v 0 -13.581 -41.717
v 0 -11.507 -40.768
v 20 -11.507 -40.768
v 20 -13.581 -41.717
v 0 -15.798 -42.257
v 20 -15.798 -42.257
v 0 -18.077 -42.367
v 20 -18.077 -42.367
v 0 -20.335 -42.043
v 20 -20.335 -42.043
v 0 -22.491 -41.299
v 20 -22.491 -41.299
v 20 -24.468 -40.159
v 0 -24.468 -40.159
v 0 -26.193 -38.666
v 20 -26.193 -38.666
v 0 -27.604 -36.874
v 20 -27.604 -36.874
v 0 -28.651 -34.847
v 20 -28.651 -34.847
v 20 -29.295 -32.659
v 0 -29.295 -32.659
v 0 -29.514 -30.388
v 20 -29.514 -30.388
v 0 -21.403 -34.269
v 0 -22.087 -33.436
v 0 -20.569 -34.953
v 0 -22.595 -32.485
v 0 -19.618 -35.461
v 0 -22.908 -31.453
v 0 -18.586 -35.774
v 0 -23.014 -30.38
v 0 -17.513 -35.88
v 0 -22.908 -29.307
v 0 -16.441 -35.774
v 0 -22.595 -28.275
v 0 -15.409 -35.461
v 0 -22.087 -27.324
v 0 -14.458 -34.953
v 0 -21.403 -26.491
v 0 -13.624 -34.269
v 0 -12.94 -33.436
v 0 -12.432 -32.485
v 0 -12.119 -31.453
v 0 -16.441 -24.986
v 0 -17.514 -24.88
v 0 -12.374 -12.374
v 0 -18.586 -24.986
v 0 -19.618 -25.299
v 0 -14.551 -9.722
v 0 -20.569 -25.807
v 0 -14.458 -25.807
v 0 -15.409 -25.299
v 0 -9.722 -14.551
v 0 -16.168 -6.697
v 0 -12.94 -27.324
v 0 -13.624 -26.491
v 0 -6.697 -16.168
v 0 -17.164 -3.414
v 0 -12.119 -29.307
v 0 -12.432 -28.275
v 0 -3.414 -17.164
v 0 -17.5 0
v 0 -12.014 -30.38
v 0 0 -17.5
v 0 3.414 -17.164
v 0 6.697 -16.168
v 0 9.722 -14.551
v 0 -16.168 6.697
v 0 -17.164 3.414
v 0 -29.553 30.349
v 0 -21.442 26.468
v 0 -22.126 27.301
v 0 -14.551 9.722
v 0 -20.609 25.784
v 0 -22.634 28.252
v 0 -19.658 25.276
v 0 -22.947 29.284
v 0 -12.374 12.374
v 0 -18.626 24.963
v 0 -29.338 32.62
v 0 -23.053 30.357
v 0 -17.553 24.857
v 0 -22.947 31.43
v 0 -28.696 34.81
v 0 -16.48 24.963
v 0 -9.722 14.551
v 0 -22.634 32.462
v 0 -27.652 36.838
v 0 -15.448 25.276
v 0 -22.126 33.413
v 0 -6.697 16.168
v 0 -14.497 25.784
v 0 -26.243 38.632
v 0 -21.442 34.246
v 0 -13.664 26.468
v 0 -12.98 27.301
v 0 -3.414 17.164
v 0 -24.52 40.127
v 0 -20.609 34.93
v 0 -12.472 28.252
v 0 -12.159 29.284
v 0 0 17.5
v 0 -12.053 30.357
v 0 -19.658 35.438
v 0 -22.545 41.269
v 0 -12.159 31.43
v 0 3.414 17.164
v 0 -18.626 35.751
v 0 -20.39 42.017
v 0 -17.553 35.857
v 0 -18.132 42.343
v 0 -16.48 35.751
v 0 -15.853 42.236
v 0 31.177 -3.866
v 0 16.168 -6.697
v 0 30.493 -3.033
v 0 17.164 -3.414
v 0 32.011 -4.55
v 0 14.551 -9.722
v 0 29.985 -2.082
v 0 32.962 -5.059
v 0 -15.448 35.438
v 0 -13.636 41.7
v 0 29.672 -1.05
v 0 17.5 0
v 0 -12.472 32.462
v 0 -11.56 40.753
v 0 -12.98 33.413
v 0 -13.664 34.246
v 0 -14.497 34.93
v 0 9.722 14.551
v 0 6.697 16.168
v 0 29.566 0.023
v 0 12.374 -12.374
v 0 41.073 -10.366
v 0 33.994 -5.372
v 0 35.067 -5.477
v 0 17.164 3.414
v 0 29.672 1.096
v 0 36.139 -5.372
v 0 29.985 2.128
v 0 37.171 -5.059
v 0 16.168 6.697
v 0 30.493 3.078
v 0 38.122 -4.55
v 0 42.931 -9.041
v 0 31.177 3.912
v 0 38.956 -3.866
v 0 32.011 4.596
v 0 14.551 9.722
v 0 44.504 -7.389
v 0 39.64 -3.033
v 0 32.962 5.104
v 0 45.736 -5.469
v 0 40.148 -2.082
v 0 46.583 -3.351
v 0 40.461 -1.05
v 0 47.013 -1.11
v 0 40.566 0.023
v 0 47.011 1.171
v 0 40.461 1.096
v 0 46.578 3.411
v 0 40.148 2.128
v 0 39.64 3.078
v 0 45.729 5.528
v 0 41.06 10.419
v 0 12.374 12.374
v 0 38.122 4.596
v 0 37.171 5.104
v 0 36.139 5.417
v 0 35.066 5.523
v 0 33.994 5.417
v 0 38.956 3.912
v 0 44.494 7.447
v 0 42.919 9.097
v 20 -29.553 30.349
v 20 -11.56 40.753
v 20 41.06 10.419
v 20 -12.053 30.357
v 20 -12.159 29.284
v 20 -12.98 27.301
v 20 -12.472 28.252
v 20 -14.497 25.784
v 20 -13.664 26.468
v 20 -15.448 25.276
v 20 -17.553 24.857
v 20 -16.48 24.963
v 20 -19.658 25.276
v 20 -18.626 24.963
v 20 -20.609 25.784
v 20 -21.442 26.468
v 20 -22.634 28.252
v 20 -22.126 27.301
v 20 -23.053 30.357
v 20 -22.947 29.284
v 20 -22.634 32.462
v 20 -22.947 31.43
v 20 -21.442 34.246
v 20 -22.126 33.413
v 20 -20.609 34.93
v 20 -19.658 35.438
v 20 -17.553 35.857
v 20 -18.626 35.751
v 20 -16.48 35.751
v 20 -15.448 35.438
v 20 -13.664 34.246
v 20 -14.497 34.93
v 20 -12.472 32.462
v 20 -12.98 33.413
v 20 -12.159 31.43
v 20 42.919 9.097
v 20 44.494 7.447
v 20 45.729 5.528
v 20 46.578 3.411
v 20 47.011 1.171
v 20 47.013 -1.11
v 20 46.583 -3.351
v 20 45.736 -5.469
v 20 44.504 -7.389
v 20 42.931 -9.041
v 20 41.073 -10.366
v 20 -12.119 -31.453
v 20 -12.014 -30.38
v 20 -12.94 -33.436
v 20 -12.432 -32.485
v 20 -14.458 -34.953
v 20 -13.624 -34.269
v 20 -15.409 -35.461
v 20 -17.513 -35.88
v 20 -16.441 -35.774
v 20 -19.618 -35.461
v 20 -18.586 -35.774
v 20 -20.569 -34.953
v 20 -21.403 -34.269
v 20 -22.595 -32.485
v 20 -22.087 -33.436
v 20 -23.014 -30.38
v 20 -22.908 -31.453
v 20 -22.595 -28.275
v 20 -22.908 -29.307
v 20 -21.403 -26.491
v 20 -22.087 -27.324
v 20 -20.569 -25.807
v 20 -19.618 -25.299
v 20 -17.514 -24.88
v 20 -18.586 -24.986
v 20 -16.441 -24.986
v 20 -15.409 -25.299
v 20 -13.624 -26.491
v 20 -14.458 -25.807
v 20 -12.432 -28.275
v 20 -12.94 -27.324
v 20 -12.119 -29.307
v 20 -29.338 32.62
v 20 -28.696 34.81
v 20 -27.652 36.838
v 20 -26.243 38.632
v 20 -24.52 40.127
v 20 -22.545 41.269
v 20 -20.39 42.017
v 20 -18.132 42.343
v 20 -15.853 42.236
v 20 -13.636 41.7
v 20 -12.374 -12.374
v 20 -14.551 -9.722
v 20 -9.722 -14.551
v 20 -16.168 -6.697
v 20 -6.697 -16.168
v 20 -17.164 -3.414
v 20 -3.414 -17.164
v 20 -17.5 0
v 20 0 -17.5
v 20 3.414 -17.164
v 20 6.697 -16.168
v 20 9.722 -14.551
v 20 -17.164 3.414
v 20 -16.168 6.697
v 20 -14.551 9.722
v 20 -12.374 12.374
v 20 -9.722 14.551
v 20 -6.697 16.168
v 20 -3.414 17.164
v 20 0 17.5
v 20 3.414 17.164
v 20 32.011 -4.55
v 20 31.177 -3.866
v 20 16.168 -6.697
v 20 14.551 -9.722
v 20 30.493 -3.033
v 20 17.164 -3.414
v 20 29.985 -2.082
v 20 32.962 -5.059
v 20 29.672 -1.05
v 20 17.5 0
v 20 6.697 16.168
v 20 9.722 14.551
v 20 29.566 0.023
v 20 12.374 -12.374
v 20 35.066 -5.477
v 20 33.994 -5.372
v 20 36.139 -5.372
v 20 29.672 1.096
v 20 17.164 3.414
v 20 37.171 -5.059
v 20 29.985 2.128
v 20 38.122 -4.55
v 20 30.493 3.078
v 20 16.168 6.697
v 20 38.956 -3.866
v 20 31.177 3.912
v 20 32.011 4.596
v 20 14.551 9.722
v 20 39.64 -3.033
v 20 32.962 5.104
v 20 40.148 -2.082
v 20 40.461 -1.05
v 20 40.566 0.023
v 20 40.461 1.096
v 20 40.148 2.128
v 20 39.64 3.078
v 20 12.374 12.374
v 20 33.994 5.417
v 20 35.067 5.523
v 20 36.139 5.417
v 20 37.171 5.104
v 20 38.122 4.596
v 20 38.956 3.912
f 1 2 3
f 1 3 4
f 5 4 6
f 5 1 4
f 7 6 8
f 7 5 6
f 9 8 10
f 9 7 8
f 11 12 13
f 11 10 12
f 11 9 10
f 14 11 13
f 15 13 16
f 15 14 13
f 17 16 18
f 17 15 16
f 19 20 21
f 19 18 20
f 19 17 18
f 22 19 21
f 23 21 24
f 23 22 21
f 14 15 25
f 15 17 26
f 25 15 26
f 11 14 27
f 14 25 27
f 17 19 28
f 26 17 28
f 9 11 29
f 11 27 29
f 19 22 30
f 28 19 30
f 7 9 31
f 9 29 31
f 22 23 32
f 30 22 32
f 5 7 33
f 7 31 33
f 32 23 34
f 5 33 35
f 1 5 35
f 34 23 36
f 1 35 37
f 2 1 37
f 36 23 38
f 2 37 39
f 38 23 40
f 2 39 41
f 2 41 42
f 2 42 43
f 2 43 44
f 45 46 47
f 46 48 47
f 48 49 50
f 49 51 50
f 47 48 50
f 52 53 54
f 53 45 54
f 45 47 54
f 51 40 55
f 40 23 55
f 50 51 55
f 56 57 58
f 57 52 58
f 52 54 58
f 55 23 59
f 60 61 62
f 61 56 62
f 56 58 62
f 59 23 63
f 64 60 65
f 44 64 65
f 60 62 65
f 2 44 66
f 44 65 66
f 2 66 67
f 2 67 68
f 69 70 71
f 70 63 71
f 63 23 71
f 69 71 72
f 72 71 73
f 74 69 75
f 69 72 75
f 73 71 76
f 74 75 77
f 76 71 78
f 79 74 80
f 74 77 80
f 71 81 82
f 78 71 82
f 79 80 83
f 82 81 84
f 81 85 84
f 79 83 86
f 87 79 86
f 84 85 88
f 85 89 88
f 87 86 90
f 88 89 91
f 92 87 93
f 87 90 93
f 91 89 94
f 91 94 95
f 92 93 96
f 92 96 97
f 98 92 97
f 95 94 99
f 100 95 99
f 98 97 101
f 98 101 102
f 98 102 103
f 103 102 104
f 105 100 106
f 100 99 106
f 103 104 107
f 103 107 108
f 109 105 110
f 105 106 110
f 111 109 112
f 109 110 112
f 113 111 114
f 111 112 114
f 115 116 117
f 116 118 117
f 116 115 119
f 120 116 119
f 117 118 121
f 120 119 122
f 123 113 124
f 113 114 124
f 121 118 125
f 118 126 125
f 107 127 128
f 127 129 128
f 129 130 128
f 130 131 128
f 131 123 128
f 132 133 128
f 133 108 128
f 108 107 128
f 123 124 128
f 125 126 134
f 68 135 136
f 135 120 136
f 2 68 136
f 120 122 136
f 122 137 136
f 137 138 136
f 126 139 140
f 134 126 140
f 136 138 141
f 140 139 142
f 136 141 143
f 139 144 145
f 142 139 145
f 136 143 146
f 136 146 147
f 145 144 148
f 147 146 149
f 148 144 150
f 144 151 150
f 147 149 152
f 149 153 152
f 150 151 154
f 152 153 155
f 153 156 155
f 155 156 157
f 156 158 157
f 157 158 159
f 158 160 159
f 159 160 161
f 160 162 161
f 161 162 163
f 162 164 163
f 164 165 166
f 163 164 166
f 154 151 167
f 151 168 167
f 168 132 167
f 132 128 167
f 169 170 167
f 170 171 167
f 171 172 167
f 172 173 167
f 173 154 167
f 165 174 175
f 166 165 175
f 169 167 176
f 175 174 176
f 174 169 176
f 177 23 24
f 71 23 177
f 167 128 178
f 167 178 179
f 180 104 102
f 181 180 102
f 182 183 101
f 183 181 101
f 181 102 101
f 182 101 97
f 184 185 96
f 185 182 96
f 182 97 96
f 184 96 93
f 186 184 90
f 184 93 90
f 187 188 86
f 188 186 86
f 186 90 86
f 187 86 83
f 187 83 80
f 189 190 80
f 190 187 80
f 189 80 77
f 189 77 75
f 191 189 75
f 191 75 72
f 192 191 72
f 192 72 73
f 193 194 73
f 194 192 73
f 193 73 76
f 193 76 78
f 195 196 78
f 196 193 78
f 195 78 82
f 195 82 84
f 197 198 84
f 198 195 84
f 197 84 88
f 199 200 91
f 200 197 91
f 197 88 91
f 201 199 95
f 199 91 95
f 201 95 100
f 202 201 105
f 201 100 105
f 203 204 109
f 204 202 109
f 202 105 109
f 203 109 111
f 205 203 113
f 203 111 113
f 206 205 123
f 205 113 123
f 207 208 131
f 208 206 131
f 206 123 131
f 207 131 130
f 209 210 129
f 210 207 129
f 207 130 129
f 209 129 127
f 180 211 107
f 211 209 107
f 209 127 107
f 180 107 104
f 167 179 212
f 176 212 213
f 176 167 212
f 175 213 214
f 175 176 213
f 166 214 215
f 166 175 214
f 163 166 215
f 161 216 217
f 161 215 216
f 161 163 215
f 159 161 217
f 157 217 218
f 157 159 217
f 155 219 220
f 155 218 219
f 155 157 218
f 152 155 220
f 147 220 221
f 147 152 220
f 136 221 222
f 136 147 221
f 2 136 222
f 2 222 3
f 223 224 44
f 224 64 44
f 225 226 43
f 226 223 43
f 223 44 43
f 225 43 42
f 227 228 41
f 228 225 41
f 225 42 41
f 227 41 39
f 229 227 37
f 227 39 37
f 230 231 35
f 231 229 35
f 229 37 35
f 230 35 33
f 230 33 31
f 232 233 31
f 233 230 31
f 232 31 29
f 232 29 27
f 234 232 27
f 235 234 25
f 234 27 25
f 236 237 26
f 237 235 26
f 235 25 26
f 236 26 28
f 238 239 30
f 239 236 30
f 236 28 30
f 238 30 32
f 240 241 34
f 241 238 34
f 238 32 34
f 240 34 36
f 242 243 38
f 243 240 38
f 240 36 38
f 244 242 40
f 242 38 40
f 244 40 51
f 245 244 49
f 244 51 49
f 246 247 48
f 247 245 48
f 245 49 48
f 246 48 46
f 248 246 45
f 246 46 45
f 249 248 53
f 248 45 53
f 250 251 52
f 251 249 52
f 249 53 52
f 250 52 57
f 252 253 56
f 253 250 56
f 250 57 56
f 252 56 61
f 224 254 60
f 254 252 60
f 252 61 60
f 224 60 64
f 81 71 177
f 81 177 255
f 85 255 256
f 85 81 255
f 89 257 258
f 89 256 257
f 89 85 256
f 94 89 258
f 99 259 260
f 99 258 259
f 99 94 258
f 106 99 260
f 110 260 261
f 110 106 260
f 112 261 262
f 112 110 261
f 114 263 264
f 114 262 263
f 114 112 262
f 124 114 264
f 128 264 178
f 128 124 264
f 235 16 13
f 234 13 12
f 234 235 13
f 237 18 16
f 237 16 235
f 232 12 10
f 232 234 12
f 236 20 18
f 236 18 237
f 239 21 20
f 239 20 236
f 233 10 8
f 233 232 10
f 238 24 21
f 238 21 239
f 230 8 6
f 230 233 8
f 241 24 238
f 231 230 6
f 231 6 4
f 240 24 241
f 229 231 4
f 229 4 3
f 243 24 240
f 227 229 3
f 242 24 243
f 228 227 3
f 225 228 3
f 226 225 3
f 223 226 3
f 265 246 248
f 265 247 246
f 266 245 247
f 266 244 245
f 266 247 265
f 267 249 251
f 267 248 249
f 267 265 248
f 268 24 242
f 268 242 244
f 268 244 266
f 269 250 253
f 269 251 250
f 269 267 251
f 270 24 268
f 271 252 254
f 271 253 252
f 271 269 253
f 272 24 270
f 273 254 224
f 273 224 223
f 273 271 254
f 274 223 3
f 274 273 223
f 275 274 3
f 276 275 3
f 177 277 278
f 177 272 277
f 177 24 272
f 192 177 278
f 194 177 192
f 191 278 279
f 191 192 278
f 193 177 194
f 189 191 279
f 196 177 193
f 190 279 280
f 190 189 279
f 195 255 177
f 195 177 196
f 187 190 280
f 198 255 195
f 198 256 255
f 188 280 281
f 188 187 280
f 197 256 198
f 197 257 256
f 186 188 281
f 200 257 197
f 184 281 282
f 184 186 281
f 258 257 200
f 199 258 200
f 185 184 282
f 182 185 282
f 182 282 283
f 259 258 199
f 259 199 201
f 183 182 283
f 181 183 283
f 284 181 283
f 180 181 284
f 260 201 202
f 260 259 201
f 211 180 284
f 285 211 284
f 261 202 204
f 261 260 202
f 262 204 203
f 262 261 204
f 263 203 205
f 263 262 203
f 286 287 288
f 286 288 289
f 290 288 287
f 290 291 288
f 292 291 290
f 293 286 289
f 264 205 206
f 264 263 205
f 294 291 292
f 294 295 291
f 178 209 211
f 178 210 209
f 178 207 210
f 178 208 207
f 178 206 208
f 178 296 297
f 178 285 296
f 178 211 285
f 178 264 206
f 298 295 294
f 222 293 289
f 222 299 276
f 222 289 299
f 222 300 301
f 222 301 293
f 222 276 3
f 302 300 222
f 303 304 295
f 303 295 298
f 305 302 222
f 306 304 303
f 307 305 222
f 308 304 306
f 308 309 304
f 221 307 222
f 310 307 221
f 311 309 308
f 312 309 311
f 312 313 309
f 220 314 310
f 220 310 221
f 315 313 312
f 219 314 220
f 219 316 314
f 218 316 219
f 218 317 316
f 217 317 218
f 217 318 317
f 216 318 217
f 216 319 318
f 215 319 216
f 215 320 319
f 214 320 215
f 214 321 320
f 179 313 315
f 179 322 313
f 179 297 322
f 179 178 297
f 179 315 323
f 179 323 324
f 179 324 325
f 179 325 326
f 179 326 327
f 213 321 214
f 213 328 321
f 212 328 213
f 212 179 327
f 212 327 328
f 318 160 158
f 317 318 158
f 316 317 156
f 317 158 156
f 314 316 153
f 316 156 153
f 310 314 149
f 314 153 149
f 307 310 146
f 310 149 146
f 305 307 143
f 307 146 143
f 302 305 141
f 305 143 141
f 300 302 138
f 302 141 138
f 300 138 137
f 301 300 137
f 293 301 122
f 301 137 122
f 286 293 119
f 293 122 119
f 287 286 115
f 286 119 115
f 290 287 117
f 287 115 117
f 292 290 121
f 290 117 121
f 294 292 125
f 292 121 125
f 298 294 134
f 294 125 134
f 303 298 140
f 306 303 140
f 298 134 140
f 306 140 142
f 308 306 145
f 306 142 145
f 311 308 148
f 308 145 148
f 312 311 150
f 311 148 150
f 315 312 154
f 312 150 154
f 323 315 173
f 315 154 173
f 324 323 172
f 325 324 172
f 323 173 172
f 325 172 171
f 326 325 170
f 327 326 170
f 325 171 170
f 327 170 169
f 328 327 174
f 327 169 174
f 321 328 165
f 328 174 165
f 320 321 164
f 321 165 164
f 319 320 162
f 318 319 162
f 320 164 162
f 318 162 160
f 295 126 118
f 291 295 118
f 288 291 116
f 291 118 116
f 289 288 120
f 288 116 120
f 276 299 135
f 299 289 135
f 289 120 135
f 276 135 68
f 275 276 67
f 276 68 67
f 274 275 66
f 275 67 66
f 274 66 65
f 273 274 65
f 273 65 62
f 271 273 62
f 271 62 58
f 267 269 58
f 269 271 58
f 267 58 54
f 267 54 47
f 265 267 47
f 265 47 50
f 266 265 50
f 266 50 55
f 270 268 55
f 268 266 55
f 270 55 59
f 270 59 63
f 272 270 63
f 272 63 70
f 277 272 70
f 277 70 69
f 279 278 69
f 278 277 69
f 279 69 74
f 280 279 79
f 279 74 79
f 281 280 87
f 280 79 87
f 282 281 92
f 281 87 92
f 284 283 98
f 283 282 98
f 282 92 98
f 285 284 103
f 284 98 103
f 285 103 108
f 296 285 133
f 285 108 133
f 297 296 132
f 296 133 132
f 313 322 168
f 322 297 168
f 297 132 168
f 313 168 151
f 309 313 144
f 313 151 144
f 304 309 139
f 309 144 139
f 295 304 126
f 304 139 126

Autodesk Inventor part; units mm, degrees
ref_plane "YZ Plane" through (0, 0, 0) normal (1, 0, 0) x (0, 1, 0)
ref_plane "XZ Plane" through (0, 0, 0) normal (0, 1, 0) x (-1, 0, 0)
ref_plane "XY Plane" through (0, 0, 0) normal (0, 0, 1) x (1, 0, 0)
sketch "Sketch1" plane through (0, 0, 0) normal (1, 0, 0) x (0, 1, 0)
  point P0 (0, 0)
sketch "Sketch2" plane through (0, 0, 0) normal (1, 0, 0) x (0, 1, 0)
  circle A0 centre (0, 0) radius 17.5
  circle A1 centre (35.0665, 0.0228) radius 5.5
  circle A2 centre (-17.553, 30.3571) radius 5.5
  circle A3 centre (-17.5135, -30.3799) radius 5.5
  circle A4 centre (-17.5135, -30.3799) radius 12
  circle A5 centre (35.0665, 0.0228) radius 12
  circle A6 centre (-17.553, 30.3571) radius 12
  line L0 (-29.5135, -30.3877) -> (-29.553, 30.3493)
  line L1 (-11.5597, 40.7533) -> (41.0597, 10.419)
  line L2 (41.0732, -10.3656) -> (-11.5068, -40.7683)
  arc A7 (34.6387, -5.4605) -> (34.6316, 5.5056) centre (0, 0) ccw
  arc A8 (-26.717, 22.6098) -> (-29.5455, 18.7634) centre (0, 0) ccw
  arc A9 (-29.521, -18.8018) -> (-26.6876, -22.6445) centre (0, 0) ccw
  arc A10 (31.0434, -16.1651) -> (32.9545, -11.7899) centre (0, 0) ccw
  dimension "d0" = 35
  dimension "d2" = 11
  dimension "d5" = 360
  dimension "d7" = 24
  dimension "d8" = 24
  dimension "d9" = 24
extrude "Extrusion1" add sketch "Sketch2" along normal blind 20
